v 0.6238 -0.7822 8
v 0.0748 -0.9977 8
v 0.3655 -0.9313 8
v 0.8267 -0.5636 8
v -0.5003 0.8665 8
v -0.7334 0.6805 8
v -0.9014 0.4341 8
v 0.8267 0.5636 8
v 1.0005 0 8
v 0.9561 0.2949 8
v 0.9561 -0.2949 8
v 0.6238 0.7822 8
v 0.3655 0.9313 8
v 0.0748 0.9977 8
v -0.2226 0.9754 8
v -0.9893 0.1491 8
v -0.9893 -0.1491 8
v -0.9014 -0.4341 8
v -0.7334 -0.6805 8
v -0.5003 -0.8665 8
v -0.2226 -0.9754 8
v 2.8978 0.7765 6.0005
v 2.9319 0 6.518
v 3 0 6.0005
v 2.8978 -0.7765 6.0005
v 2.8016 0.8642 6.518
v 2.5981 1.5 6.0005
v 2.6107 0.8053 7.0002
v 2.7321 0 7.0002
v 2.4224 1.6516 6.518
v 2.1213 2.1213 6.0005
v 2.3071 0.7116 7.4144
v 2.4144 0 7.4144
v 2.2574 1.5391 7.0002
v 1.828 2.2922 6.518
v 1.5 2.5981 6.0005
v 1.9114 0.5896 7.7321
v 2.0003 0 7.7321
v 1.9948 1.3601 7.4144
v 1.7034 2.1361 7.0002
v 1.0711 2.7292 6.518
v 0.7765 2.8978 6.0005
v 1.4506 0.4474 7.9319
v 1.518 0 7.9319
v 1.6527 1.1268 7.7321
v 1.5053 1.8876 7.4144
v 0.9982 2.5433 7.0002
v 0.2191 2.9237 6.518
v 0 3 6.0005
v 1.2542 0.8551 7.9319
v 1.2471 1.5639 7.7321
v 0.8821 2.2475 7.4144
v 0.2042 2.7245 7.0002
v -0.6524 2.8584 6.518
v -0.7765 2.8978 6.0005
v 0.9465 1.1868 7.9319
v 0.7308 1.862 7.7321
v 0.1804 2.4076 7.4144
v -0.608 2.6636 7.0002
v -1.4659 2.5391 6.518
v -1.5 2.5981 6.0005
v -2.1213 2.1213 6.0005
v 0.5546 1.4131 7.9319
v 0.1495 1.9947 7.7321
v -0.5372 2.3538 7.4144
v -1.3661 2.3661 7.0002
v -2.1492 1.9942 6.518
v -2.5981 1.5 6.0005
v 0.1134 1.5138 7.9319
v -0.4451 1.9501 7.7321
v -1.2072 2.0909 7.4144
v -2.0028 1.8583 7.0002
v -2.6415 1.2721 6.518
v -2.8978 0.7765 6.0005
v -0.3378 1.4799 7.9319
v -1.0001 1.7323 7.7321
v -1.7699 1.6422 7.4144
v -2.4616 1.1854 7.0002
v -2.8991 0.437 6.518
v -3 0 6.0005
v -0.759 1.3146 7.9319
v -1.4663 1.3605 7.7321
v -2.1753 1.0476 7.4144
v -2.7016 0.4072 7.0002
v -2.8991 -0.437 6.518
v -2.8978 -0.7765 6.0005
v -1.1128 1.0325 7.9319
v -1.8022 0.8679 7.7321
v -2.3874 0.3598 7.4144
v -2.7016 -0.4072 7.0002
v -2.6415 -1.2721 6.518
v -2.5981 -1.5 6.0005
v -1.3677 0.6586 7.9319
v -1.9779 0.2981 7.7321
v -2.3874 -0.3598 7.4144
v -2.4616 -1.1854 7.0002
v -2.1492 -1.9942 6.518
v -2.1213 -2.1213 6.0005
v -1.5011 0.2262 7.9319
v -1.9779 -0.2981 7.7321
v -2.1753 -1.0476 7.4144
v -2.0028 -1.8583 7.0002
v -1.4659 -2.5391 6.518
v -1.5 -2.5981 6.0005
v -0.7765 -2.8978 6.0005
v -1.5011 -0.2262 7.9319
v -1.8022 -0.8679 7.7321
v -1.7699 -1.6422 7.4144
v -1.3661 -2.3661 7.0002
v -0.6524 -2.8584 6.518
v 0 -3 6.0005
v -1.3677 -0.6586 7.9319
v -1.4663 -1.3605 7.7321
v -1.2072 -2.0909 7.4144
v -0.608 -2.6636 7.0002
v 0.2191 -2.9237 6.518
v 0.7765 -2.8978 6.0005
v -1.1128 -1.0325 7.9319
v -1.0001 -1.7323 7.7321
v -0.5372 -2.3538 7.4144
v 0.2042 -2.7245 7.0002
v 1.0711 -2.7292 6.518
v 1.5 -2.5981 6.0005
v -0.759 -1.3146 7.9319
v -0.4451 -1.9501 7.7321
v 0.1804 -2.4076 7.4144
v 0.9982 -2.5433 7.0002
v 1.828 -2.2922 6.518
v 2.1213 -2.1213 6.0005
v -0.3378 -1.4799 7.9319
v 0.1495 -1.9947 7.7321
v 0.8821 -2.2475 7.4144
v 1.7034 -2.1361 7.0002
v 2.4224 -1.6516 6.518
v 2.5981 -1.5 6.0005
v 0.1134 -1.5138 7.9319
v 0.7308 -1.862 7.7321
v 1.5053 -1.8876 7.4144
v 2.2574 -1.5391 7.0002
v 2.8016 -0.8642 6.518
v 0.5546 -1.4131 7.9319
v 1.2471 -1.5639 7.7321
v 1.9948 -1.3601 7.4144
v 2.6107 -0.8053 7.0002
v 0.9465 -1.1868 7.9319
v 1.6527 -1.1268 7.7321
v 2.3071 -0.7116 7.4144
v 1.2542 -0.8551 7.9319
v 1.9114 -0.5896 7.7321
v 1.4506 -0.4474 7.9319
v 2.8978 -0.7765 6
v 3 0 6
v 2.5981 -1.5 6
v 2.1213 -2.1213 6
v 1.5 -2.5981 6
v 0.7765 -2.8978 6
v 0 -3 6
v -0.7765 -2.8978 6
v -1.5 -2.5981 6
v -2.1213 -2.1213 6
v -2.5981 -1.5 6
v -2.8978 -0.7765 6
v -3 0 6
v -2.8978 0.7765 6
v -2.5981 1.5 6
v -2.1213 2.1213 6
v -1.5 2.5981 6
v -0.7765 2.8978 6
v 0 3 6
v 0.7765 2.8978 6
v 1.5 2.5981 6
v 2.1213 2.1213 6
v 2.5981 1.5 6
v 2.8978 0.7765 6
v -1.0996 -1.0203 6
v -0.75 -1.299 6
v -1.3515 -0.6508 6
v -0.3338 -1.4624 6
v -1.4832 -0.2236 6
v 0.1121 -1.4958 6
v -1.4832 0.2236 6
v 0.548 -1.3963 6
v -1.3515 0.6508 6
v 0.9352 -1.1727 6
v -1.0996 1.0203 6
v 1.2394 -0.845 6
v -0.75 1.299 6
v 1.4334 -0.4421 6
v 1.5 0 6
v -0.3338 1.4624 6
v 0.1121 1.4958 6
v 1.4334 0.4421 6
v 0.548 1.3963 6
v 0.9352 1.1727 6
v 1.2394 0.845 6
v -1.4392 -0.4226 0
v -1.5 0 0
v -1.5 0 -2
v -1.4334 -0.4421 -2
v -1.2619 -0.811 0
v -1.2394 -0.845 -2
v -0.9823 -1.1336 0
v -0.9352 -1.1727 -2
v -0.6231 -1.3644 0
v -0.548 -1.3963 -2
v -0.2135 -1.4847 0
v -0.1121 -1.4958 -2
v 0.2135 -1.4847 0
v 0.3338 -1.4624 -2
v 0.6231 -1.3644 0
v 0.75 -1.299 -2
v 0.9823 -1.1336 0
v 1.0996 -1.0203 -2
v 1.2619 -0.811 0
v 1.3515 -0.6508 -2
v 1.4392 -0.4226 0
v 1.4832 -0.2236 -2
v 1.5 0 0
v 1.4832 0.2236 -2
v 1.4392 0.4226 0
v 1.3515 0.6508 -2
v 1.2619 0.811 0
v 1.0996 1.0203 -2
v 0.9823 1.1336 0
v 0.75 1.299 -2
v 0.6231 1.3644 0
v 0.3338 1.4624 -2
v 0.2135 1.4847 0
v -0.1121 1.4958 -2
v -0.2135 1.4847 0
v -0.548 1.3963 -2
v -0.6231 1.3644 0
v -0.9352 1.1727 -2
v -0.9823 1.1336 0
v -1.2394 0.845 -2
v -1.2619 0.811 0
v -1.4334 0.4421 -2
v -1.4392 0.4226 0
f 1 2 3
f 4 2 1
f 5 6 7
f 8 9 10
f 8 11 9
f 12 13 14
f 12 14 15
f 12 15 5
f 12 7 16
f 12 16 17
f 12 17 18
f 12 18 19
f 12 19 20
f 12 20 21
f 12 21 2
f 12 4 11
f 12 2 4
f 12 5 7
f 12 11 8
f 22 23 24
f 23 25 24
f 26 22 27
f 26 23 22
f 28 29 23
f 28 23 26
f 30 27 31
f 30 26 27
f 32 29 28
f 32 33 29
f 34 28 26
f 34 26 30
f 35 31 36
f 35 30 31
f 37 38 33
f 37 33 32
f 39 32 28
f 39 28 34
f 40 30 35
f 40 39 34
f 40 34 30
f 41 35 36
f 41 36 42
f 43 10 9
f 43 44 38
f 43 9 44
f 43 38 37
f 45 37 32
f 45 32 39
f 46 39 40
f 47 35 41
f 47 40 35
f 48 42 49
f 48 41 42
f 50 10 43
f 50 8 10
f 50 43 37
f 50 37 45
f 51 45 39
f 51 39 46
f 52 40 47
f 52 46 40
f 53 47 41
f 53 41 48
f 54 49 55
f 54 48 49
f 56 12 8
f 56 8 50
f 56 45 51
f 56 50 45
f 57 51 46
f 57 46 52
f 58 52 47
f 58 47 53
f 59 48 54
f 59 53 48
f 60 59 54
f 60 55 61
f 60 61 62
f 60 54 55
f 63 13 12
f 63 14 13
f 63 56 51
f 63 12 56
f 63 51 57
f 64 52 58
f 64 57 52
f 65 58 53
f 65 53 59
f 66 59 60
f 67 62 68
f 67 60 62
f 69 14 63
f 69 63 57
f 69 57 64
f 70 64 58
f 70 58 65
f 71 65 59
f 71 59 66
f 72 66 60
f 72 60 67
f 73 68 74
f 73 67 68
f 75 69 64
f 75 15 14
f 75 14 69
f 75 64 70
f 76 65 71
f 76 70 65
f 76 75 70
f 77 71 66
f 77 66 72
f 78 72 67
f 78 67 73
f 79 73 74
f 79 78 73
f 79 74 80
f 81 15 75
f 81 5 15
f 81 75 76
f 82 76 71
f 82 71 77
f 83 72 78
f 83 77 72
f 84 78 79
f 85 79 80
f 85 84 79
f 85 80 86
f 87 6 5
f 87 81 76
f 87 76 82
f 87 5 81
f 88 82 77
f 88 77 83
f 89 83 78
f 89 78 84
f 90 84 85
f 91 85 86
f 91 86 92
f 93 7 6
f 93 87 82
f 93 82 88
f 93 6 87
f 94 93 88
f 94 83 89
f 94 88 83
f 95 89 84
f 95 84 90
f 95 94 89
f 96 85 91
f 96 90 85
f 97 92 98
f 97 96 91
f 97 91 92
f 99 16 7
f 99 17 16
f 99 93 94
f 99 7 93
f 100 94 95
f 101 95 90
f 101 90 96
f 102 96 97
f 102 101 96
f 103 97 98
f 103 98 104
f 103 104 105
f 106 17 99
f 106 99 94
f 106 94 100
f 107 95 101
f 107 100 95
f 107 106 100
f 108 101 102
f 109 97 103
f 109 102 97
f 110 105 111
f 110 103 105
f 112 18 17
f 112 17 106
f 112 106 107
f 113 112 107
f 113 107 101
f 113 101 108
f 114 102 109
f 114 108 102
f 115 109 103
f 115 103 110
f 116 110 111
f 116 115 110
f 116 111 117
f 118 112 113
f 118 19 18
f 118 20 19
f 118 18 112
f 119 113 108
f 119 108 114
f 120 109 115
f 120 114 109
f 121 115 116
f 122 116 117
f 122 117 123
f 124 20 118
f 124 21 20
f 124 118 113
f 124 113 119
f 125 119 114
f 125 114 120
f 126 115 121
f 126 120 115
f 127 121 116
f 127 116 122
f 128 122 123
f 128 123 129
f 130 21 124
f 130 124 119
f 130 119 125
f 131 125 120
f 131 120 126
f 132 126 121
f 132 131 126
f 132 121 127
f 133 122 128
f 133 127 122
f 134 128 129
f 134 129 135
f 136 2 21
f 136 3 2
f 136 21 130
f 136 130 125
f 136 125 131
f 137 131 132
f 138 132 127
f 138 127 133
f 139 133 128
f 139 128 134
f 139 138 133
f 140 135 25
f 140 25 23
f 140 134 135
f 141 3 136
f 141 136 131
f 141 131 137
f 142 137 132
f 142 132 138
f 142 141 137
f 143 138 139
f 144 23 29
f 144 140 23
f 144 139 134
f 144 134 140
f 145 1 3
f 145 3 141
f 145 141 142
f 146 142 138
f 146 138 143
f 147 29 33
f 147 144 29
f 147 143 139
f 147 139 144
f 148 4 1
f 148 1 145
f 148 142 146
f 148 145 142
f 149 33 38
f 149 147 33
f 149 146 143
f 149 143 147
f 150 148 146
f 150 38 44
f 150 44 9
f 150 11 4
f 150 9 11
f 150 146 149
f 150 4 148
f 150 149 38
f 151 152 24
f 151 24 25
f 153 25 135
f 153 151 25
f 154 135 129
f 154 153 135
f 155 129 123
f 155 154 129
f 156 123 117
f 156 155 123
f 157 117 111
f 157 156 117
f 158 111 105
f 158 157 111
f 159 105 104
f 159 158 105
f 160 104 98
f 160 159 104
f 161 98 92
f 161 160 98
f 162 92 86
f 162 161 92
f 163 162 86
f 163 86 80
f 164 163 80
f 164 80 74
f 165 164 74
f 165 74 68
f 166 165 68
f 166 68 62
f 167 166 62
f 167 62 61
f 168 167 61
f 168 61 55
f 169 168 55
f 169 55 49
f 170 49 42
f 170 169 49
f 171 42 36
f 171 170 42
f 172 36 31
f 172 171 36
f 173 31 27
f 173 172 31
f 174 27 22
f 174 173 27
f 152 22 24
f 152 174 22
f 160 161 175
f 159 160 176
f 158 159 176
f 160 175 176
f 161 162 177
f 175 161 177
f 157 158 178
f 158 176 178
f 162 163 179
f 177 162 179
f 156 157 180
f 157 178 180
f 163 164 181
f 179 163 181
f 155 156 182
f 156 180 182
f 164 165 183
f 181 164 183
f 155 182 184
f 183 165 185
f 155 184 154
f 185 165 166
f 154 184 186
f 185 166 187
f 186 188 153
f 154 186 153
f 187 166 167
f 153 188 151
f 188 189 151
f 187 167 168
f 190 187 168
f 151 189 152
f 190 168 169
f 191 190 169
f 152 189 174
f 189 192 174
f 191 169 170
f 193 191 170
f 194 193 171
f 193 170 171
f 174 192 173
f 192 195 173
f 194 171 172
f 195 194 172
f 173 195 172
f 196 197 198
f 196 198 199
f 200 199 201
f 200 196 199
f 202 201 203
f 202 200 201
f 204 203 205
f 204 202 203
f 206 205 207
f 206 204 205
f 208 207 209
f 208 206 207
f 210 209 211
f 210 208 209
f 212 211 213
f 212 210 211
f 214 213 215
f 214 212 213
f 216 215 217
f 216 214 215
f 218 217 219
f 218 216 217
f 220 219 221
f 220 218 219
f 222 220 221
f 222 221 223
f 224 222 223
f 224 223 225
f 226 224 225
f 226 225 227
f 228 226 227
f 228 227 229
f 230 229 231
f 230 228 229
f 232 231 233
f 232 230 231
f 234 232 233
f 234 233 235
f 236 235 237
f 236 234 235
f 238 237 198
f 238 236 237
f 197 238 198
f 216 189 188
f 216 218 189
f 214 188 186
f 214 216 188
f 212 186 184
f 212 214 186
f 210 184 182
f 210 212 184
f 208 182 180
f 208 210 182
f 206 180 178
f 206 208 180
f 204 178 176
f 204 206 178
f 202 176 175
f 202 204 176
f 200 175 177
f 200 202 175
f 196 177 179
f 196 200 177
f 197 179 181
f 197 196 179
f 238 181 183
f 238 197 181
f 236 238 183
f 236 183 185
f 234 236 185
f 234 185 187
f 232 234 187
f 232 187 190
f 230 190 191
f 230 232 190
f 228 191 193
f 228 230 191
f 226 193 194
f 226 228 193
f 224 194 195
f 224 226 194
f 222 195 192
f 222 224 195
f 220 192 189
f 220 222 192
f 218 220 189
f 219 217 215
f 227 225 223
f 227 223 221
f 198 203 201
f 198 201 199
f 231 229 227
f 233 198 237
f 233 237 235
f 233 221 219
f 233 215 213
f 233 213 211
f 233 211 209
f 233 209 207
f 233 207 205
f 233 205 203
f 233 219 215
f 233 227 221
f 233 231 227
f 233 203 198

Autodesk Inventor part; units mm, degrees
ref_plane "YZ Plane" through (0, 0, 0) normal (1, 0, 0) x (0, 1, 0)
ref_plane "XZ Plane" through (0, 0, 0) normal (0, 1, 0) x (-1, 0, 0)
ref_plane "XY Plane" through (0, 0, 0) normal (0, 0, 1) x (1, 0, 0)
sketch "スケッチ1" plane through (0, 0, 0) normal (0, 0, 1) x (1, 0, 0)
  circle A0 centre (0, 0) radius 1.5
  dimension "d0" = 3
extrude "押し出し1" add sketch "スケッチ1" along normal blind 6
sketch "スケッチ2" plane through (0, 0, 6) normal (0, 0, 1) x (1, 0, 0)
  circle A0 centre (0, 0) radius 1.5 projected
  circle A1 centre (0, 0) radius 3
  dimension "d3" = 6
extrude "押し出し2" add sketch "スケッチ2" along normal blind 2 contours A0 | A1
fillet "フィレット1" radius 2 1 edges at (-3, 0, 8)
thread "ねじ1" size "M3x0.5" class "6g" standard "ANSI Metric M Profile" full length
sketch "スケッチ3" plane through (0, 0, 0) normal (0, 0, -1) x (-1, 0, 0)
  circle A0 centre (0, 0) radius 1.5 projected
extrude "押し出し3" add sketch "スケッチ3" along normal blind 2
properties part number "SB　8mmなべネジ" material "Steel, Mild"
